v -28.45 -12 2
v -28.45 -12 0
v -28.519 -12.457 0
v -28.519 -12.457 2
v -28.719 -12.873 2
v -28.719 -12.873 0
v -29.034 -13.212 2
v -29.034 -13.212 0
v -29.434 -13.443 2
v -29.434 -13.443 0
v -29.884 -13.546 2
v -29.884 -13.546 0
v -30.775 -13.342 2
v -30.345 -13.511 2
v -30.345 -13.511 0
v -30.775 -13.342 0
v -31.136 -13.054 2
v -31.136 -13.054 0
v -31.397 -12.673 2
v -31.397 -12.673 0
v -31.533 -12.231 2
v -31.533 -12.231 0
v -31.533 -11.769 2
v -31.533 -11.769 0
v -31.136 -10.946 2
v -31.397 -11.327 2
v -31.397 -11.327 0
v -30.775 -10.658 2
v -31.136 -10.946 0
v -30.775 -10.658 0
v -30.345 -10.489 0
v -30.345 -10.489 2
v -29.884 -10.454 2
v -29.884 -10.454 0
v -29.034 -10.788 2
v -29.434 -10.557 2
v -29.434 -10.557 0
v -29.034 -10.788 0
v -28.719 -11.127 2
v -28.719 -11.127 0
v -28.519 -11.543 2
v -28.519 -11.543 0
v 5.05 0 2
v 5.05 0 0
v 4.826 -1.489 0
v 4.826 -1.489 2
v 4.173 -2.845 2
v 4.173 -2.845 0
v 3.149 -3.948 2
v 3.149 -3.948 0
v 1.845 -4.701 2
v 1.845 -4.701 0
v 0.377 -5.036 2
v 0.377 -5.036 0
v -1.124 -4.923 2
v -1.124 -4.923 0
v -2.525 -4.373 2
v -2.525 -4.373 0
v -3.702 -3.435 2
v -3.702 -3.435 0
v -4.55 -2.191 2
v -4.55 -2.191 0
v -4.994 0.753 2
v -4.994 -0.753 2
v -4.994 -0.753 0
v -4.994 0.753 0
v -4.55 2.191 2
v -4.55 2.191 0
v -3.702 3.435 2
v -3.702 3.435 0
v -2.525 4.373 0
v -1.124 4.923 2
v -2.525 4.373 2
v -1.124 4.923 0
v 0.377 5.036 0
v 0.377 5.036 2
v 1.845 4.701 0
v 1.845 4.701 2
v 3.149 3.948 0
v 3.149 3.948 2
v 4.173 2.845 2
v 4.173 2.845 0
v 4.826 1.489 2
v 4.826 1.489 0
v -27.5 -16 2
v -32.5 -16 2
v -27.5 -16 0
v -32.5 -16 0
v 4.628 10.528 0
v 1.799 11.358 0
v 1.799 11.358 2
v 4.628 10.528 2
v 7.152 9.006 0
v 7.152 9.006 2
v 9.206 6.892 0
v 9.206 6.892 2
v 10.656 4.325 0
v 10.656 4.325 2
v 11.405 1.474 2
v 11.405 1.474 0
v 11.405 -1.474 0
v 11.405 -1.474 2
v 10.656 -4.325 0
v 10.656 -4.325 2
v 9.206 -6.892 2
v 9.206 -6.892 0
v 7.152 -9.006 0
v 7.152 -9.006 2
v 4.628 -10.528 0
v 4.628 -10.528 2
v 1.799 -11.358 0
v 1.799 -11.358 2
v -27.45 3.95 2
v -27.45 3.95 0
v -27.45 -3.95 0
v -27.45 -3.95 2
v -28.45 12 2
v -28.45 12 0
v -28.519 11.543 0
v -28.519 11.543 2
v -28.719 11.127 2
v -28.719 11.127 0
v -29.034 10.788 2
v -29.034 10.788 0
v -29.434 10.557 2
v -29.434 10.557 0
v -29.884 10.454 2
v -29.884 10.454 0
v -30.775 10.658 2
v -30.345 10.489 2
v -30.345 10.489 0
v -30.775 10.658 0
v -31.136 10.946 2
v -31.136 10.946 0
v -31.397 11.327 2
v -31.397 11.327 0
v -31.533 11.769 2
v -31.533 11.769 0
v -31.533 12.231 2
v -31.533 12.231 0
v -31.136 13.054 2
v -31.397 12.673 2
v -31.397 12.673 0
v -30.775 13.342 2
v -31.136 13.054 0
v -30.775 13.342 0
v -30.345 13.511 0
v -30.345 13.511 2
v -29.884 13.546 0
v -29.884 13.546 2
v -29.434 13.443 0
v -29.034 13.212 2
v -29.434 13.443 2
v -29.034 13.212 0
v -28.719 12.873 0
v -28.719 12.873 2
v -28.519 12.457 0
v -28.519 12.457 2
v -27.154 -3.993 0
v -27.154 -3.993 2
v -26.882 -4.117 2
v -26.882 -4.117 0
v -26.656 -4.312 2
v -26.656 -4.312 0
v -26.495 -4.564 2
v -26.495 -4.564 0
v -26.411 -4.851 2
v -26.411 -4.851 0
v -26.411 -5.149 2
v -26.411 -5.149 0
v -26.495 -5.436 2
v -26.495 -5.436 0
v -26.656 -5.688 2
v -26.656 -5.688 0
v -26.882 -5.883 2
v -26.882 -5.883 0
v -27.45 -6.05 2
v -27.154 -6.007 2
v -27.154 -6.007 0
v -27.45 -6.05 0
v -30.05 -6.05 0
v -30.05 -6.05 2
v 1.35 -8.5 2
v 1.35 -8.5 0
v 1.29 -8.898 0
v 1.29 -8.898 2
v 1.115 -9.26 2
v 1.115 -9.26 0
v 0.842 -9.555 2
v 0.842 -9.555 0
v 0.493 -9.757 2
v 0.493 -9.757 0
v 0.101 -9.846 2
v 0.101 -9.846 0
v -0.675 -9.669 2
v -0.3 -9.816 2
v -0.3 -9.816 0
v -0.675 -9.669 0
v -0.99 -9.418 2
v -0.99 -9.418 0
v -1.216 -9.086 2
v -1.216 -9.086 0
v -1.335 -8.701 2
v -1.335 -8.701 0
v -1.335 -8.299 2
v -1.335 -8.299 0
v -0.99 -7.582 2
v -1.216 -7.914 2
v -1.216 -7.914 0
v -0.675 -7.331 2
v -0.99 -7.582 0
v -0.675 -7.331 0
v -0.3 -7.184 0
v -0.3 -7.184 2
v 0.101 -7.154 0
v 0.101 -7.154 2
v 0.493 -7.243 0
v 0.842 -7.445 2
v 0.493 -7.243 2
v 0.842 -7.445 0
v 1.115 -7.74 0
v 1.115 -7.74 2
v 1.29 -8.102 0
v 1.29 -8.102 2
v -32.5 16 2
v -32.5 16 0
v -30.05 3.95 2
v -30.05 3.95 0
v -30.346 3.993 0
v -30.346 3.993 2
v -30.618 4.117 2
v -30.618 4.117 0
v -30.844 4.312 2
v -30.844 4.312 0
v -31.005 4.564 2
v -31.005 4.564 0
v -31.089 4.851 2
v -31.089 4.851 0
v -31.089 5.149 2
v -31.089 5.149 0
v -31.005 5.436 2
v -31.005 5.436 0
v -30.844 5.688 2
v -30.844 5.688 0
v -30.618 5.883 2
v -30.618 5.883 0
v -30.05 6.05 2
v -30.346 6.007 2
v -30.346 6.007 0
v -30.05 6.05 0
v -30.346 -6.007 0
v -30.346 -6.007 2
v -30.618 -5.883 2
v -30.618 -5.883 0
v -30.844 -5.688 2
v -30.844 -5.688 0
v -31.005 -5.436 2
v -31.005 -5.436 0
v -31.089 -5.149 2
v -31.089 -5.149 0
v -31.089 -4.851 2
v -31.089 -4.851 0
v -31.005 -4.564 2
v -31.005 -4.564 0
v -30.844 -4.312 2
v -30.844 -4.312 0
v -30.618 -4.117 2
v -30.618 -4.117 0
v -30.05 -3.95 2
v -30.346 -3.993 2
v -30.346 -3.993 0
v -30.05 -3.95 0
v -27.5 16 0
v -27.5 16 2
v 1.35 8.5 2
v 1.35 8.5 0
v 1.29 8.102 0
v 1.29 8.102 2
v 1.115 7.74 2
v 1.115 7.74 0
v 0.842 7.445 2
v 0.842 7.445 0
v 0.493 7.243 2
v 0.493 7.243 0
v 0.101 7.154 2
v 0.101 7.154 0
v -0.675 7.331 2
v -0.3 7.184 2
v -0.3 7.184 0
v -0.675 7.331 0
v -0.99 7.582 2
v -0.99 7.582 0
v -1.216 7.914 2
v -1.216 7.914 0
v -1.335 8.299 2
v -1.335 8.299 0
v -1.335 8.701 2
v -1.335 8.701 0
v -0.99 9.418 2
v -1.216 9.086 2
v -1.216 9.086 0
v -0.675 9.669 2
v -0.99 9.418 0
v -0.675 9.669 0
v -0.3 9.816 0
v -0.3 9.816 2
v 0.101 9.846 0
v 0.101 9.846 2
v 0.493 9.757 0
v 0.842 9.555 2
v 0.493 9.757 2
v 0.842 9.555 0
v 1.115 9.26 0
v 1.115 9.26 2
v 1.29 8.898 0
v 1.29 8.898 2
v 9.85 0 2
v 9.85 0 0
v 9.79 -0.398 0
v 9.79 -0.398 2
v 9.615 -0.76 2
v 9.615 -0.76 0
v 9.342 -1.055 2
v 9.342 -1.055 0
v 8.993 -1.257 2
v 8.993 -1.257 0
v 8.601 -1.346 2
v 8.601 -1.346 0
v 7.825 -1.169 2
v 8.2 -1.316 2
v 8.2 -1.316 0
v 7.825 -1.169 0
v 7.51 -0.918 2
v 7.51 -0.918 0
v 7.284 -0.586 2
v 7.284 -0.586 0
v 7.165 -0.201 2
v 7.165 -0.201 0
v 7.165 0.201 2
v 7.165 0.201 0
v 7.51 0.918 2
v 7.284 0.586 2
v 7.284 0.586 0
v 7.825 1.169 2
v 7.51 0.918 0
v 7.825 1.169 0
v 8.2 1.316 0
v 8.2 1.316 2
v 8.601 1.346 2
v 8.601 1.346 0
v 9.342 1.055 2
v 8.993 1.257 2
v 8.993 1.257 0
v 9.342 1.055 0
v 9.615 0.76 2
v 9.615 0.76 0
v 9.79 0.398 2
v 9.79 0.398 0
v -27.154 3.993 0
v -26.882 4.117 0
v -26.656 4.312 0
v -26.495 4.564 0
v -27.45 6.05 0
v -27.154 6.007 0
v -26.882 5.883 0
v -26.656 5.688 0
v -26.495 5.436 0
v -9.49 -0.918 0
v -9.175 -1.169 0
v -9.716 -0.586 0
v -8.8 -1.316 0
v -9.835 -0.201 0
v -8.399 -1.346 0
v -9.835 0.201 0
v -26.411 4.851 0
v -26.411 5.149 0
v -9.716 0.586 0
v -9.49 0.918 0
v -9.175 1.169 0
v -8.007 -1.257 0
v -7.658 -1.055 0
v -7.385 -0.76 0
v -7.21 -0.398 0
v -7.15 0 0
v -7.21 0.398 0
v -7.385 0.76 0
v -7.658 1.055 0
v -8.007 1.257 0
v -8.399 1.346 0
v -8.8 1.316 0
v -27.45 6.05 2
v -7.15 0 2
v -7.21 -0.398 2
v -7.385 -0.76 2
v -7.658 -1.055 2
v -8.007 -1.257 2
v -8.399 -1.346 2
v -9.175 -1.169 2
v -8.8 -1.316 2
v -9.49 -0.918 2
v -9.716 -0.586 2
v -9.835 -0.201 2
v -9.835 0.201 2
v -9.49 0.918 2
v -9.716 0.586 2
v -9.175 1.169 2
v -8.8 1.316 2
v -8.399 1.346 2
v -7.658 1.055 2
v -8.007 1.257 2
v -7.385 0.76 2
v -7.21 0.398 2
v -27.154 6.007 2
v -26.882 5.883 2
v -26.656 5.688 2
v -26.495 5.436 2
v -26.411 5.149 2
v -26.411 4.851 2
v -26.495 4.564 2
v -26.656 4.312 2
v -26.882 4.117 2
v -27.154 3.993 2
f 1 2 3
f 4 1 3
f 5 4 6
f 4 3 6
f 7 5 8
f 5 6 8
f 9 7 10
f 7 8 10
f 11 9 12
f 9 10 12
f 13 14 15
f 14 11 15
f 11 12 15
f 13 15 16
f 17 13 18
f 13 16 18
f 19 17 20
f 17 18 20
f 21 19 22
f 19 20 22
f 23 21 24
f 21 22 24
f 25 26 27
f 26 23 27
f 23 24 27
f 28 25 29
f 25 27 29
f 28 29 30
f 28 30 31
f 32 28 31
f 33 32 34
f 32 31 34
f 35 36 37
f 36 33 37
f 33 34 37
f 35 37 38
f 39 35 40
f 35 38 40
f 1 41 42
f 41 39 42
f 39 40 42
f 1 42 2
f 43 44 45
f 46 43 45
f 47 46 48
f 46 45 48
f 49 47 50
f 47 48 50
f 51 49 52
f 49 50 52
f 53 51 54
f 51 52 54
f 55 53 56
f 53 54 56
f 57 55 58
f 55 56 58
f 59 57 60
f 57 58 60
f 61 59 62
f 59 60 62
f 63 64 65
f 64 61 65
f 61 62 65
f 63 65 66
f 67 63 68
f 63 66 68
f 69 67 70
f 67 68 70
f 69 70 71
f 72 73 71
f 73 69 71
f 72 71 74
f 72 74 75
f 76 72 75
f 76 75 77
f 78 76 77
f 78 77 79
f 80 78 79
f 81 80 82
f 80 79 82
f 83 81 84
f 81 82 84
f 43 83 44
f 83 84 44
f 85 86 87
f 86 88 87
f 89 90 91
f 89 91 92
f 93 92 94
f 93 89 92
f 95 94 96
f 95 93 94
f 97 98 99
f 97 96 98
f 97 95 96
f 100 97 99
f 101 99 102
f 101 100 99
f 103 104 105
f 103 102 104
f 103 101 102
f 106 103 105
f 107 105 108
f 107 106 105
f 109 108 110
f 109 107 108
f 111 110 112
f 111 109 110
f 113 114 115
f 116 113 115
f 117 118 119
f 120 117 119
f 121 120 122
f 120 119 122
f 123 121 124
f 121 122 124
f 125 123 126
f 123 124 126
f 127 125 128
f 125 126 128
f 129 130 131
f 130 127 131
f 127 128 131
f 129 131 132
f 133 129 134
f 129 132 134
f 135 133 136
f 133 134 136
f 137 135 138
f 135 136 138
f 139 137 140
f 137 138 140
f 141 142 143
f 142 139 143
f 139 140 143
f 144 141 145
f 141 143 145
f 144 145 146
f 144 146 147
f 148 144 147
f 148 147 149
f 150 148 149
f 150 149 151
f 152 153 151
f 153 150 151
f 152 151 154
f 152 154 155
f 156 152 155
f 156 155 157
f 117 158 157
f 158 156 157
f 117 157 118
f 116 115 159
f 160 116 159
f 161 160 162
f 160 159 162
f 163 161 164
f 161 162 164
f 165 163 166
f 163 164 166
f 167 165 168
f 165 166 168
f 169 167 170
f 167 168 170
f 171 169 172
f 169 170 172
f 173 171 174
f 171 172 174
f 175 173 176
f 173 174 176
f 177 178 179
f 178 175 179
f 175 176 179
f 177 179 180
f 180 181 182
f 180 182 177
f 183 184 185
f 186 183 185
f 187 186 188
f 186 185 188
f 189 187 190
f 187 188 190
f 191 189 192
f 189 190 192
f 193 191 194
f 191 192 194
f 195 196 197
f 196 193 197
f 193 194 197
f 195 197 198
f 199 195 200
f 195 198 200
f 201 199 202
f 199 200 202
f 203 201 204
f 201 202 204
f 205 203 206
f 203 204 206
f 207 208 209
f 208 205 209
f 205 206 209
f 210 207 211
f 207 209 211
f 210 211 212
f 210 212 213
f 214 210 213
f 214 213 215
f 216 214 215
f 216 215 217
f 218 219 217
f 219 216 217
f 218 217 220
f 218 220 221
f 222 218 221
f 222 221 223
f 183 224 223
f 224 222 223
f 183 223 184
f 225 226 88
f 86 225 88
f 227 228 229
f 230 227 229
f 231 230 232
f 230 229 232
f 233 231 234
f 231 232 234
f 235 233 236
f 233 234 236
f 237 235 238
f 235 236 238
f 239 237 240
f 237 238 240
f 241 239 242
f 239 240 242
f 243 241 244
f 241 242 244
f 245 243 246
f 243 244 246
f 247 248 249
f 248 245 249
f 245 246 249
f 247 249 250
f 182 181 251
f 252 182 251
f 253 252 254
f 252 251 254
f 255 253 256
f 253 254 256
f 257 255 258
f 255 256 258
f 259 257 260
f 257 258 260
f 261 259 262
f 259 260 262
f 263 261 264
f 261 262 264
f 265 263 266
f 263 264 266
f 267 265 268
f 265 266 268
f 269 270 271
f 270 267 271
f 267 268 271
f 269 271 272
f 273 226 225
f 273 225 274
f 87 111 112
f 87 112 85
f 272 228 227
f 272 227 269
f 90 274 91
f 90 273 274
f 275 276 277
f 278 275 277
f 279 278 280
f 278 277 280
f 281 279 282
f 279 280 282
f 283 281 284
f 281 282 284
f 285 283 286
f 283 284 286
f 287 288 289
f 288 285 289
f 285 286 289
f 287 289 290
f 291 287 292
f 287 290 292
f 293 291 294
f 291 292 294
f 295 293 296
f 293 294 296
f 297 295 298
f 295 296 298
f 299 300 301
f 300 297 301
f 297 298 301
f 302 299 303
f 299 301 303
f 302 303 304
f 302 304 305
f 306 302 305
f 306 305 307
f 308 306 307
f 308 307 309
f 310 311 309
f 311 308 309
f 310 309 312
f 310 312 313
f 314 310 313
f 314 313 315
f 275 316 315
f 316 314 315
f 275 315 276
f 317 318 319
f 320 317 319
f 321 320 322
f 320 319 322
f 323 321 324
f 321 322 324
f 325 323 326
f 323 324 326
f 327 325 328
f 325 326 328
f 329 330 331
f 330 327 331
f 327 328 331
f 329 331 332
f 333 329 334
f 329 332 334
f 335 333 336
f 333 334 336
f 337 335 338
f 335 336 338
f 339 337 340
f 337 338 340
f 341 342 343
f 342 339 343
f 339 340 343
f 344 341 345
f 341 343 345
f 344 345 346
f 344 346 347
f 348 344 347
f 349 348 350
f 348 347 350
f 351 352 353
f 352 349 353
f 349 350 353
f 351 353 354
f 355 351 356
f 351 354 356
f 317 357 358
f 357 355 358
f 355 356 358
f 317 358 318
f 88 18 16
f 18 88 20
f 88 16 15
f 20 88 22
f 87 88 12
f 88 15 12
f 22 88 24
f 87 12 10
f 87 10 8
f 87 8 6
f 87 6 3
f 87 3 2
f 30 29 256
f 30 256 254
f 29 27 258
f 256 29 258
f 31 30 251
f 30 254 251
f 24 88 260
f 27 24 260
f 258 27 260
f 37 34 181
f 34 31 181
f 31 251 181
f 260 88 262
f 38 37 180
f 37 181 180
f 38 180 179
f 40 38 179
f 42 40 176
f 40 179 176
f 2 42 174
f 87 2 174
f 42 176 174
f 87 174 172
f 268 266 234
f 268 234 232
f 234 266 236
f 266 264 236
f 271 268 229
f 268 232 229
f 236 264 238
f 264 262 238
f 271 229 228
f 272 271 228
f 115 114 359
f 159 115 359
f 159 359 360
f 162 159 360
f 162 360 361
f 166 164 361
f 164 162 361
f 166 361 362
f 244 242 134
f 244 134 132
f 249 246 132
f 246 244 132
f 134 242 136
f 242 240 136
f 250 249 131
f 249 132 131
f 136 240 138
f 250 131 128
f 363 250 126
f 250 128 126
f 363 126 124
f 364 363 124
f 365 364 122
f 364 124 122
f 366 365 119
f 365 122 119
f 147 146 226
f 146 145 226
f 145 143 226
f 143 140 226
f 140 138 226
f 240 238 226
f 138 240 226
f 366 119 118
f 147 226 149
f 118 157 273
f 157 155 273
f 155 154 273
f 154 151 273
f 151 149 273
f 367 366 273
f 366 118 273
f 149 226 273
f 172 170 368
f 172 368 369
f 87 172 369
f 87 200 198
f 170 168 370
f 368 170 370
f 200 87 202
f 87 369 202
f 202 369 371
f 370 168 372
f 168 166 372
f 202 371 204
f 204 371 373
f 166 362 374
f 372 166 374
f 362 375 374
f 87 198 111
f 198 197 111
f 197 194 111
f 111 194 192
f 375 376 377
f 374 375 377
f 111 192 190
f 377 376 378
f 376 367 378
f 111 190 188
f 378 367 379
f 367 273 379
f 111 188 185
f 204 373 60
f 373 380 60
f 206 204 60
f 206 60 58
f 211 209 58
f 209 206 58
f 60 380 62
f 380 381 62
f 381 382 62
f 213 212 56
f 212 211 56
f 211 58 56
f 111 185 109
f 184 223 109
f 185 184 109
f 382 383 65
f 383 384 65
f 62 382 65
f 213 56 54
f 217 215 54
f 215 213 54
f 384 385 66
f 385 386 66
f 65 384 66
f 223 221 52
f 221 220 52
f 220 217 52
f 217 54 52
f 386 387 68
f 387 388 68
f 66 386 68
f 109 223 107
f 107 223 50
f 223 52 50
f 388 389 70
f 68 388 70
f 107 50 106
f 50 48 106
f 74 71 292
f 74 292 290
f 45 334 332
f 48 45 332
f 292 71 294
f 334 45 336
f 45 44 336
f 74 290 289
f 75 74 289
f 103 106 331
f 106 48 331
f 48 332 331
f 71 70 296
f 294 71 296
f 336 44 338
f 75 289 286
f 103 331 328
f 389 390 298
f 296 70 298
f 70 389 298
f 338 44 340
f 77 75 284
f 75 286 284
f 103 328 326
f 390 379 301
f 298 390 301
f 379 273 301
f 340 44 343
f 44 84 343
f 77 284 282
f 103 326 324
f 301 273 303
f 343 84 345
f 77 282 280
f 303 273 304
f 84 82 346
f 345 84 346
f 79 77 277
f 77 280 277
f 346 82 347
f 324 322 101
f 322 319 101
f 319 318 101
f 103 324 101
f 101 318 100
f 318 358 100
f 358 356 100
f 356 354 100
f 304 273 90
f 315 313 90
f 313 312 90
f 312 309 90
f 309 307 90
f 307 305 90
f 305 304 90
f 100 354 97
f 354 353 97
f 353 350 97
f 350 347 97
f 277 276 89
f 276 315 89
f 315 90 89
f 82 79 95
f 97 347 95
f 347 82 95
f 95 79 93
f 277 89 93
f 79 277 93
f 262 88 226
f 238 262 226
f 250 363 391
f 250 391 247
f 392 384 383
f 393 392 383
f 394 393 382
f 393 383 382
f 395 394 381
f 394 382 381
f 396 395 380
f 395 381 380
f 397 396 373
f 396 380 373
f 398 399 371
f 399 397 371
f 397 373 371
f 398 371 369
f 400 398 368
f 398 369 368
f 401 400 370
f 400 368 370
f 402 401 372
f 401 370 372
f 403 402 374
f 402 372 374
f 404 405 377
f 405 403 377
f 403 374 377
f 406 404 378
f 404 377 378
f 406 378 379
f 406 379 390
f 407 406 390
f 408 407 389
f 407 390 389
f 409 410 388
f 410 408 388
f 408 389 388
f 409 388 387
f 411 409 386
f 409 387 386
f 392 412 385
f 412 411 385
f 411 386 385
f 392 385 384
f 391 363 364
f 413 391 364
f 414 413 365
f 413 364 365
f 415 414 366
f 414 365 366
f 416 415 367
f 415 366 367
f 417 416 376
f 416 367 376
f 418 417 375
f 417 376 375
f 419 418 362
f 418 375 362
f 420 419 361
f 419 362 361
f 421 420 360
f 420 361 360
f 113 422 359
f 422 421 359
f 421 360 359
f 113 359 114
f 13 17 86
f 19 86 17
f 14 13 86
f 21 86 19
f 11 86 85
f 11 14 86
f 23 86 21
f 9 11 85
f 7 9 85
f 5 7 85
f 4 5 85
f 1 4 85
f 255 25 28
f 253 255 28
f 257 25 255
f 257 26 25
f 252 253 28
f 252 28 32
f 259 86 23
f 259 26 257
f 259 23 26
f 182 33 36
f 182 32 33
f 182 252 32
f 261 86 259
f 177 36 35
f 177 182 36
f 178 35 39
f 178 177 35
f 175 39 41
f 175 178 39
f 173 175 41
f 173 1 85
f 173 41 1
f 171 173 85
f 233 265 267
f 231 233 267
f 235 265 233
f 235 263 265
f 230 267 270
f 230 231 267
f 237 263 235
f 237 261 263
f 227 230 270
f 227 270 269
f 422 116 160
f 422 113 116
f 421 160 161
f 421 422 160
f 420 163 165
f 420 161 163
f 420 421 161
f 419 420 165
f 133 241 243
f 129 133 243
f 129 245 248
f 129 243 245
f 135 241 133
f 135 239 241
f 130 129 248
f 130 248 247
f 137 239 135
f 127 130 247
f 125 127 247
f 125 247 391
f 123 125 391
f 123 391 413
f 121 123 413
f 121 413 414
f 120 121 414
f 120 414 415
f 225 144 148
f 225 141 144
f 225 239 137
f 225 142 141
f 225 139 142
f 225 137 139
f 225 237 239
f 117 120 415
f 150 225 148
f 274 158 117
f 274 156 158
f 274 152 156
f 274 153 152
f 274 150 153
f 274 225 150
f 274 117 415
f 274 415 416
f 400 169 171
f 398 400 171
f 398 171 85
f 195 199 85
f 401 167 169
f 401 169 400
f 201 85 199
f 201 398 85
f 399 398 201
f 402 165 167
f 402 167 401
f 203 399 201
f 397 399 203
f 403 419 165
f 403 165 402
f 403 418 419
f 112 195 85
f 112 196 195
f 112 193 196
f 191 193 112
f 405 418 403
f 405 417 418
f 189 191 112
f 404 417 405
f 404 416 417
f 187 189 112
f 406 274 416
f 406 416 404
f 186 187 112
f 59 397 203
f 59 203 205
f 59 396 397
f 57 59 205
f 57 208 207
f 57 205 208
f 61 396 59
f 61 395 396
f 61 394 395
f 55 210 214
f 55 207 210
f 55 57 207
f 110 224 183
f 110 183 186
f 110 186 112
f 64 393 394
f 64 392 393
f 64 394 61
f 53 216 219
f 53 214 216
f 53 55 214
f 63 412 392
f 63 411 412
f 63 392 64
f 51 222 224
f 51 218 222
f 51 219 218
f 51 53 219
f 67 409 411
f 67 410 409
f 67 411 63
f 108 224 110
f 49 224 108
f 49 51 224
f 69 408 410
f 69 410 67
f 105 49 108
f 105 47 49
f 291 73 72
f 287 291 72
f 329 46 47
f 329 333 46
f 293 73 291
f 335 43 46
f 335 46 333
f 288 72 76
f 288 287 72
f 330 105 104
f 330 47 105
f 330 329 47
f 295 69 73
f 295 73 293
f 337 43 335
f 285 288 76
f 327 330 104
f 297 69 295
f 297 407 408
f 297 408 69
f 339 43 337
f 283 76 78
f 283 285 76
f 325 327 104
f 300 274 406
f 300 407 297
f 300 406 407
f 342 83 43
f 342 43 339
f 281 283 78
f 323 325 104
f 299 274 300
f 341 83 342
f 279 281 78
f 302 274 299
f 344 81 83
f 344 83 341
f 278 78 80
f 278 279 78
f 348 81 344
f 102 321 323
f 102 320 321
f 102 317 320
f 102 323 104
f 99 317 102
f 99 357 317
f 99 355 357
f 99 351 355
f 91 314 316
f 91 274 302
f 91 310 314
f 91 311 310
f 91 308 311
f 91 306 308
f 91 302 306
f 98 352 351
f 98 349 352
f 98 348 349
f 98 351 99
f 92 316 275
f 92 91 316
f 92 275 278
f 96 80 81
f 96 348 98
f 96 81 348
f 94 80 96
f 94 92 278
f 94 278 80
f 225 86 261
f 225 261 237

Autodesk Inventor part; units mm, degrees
ref_plane "YZ Plane" through (0, 0, 0) normal (1, 0, 0) x (0, 1, 0)
ref_plane "XZ Plane" through (0, 0, 0) normal (0, 1, 0) x (-1, 0, 0)
ref_plane "XY Plane" through (0, 0, 0) normal (0, 0, 1) x (1, 0, 0)
sketch "スケッチ1" plane through (0, 0, 0) normal (0, 0, 1) x (1, 0, 0)
  circle A0 centre (0, 0) radius 10.5 construction
  circle A1 centre (0, 8.5) radius 1.35
  circle A2 centre (-8.5, 0) radius 1.35
  circle A3 centre (0, -8.5) radius 1.35
  circle A4 centre (8.5, 0) radius 1.35
  circle A5 centre (0, 0) radius 5.05
  line L0 (-30, 6) -> (-27.5, 6) construction
  line L1 (-27.5, 6) -> (-27.5, -6) construction
  line L2 (-27.5, -6) -> (-30, -6) construction
  line L3 (-30, -6) -> (-30, 6) construction
  line L4 (-27.45, 6.05) -> (-30.05, 6.05) construction
  line L5 (-30.05, 6.05) -> (-30.05, -6.05) construction
  line L6 (-30.05, -6.05) -> (-27.45, -6.05) construction
  line L7 (-27.45, -6.05) -> (-27.45, 6.05) construction
  circle A6 centre (-30.05, 5) radius 1.05 construction
  line L8 (-27.45, 6.05) -> (-30.05, 6.05)
  arc A7 (-30.05, 6.05) -> (-30.05, 3.95) centre (-30.05, 5) ccw
  line L9 (-30.05, 3.95) -> (-30.05, -3.95)
  line L10 (-28.75, 6.05) -> (-28.75, -6.05) construction
  line L11 (-30.05, 0) -> (-27.5, 0) construction
  arc A8 (-30.05, -3.95) -> (-30.05, -6.05) centre (-30.05, -5) ccw
  line L12 (-30.05, -6.05) -> (-27.45, -6.05)
  line L13 (-27.45, 3.95) -> (-27.45, -3.95)
  arc A9 (-27.45, 3.95) -> (-27.45, 6.05) centre (-27.45, 5) ccw
  arc A10 (-27.45, -6.05) -> (-27.45, -3.95) centre (-27.45, -5) ccw
  circle A11 centre (-30, 12) radius 1.55
  circle A12 centre (-30, -12) radius 1.55
  line L14 (-32.5, 16) -> (-27.5, 16)
  line L15 (-32.5, -16) -> (-27.5, -16)
  arc A13 (1.7994, -11.3584) -> (1.7994, 11.3584) centre (0, 0) ccw
  line L16 (-32.5, 16) -> (-32.5, -16)
  line L17 (-27.5, 16) -> (1.7994, 11.3584)
  line L18 (1.7994, -11.3584) -> (-27.5, -16)
  point P0 (-28.775, 0)
  dimension "d29" = 2.1
  dimension "d0" = 21
  dimension "d3" = 8.5
  dimension "d4" = 2.7
  dimension "d7" = 360
  dimension "d9" = 10.1
  dimension "d10" = 2.5
  dimension "d30" = 0.05
  dimension "d31" = 6
  dimension "d33" = 3.1
  dimension "d43" = 1
  dimension "d57" = 32
  dimension "d61" = 32.5
  dimension "d62" = 5
  dimension "d63" = 2.5
  dimension "d65" = 10
extrude "押し出し1" add sketch "スケッチ1" along normal blind 2
equation "\"d23\" = 7"
properties part number "Shoulder_vertical_frame_02" material "アルミニウム 2014-T4"
